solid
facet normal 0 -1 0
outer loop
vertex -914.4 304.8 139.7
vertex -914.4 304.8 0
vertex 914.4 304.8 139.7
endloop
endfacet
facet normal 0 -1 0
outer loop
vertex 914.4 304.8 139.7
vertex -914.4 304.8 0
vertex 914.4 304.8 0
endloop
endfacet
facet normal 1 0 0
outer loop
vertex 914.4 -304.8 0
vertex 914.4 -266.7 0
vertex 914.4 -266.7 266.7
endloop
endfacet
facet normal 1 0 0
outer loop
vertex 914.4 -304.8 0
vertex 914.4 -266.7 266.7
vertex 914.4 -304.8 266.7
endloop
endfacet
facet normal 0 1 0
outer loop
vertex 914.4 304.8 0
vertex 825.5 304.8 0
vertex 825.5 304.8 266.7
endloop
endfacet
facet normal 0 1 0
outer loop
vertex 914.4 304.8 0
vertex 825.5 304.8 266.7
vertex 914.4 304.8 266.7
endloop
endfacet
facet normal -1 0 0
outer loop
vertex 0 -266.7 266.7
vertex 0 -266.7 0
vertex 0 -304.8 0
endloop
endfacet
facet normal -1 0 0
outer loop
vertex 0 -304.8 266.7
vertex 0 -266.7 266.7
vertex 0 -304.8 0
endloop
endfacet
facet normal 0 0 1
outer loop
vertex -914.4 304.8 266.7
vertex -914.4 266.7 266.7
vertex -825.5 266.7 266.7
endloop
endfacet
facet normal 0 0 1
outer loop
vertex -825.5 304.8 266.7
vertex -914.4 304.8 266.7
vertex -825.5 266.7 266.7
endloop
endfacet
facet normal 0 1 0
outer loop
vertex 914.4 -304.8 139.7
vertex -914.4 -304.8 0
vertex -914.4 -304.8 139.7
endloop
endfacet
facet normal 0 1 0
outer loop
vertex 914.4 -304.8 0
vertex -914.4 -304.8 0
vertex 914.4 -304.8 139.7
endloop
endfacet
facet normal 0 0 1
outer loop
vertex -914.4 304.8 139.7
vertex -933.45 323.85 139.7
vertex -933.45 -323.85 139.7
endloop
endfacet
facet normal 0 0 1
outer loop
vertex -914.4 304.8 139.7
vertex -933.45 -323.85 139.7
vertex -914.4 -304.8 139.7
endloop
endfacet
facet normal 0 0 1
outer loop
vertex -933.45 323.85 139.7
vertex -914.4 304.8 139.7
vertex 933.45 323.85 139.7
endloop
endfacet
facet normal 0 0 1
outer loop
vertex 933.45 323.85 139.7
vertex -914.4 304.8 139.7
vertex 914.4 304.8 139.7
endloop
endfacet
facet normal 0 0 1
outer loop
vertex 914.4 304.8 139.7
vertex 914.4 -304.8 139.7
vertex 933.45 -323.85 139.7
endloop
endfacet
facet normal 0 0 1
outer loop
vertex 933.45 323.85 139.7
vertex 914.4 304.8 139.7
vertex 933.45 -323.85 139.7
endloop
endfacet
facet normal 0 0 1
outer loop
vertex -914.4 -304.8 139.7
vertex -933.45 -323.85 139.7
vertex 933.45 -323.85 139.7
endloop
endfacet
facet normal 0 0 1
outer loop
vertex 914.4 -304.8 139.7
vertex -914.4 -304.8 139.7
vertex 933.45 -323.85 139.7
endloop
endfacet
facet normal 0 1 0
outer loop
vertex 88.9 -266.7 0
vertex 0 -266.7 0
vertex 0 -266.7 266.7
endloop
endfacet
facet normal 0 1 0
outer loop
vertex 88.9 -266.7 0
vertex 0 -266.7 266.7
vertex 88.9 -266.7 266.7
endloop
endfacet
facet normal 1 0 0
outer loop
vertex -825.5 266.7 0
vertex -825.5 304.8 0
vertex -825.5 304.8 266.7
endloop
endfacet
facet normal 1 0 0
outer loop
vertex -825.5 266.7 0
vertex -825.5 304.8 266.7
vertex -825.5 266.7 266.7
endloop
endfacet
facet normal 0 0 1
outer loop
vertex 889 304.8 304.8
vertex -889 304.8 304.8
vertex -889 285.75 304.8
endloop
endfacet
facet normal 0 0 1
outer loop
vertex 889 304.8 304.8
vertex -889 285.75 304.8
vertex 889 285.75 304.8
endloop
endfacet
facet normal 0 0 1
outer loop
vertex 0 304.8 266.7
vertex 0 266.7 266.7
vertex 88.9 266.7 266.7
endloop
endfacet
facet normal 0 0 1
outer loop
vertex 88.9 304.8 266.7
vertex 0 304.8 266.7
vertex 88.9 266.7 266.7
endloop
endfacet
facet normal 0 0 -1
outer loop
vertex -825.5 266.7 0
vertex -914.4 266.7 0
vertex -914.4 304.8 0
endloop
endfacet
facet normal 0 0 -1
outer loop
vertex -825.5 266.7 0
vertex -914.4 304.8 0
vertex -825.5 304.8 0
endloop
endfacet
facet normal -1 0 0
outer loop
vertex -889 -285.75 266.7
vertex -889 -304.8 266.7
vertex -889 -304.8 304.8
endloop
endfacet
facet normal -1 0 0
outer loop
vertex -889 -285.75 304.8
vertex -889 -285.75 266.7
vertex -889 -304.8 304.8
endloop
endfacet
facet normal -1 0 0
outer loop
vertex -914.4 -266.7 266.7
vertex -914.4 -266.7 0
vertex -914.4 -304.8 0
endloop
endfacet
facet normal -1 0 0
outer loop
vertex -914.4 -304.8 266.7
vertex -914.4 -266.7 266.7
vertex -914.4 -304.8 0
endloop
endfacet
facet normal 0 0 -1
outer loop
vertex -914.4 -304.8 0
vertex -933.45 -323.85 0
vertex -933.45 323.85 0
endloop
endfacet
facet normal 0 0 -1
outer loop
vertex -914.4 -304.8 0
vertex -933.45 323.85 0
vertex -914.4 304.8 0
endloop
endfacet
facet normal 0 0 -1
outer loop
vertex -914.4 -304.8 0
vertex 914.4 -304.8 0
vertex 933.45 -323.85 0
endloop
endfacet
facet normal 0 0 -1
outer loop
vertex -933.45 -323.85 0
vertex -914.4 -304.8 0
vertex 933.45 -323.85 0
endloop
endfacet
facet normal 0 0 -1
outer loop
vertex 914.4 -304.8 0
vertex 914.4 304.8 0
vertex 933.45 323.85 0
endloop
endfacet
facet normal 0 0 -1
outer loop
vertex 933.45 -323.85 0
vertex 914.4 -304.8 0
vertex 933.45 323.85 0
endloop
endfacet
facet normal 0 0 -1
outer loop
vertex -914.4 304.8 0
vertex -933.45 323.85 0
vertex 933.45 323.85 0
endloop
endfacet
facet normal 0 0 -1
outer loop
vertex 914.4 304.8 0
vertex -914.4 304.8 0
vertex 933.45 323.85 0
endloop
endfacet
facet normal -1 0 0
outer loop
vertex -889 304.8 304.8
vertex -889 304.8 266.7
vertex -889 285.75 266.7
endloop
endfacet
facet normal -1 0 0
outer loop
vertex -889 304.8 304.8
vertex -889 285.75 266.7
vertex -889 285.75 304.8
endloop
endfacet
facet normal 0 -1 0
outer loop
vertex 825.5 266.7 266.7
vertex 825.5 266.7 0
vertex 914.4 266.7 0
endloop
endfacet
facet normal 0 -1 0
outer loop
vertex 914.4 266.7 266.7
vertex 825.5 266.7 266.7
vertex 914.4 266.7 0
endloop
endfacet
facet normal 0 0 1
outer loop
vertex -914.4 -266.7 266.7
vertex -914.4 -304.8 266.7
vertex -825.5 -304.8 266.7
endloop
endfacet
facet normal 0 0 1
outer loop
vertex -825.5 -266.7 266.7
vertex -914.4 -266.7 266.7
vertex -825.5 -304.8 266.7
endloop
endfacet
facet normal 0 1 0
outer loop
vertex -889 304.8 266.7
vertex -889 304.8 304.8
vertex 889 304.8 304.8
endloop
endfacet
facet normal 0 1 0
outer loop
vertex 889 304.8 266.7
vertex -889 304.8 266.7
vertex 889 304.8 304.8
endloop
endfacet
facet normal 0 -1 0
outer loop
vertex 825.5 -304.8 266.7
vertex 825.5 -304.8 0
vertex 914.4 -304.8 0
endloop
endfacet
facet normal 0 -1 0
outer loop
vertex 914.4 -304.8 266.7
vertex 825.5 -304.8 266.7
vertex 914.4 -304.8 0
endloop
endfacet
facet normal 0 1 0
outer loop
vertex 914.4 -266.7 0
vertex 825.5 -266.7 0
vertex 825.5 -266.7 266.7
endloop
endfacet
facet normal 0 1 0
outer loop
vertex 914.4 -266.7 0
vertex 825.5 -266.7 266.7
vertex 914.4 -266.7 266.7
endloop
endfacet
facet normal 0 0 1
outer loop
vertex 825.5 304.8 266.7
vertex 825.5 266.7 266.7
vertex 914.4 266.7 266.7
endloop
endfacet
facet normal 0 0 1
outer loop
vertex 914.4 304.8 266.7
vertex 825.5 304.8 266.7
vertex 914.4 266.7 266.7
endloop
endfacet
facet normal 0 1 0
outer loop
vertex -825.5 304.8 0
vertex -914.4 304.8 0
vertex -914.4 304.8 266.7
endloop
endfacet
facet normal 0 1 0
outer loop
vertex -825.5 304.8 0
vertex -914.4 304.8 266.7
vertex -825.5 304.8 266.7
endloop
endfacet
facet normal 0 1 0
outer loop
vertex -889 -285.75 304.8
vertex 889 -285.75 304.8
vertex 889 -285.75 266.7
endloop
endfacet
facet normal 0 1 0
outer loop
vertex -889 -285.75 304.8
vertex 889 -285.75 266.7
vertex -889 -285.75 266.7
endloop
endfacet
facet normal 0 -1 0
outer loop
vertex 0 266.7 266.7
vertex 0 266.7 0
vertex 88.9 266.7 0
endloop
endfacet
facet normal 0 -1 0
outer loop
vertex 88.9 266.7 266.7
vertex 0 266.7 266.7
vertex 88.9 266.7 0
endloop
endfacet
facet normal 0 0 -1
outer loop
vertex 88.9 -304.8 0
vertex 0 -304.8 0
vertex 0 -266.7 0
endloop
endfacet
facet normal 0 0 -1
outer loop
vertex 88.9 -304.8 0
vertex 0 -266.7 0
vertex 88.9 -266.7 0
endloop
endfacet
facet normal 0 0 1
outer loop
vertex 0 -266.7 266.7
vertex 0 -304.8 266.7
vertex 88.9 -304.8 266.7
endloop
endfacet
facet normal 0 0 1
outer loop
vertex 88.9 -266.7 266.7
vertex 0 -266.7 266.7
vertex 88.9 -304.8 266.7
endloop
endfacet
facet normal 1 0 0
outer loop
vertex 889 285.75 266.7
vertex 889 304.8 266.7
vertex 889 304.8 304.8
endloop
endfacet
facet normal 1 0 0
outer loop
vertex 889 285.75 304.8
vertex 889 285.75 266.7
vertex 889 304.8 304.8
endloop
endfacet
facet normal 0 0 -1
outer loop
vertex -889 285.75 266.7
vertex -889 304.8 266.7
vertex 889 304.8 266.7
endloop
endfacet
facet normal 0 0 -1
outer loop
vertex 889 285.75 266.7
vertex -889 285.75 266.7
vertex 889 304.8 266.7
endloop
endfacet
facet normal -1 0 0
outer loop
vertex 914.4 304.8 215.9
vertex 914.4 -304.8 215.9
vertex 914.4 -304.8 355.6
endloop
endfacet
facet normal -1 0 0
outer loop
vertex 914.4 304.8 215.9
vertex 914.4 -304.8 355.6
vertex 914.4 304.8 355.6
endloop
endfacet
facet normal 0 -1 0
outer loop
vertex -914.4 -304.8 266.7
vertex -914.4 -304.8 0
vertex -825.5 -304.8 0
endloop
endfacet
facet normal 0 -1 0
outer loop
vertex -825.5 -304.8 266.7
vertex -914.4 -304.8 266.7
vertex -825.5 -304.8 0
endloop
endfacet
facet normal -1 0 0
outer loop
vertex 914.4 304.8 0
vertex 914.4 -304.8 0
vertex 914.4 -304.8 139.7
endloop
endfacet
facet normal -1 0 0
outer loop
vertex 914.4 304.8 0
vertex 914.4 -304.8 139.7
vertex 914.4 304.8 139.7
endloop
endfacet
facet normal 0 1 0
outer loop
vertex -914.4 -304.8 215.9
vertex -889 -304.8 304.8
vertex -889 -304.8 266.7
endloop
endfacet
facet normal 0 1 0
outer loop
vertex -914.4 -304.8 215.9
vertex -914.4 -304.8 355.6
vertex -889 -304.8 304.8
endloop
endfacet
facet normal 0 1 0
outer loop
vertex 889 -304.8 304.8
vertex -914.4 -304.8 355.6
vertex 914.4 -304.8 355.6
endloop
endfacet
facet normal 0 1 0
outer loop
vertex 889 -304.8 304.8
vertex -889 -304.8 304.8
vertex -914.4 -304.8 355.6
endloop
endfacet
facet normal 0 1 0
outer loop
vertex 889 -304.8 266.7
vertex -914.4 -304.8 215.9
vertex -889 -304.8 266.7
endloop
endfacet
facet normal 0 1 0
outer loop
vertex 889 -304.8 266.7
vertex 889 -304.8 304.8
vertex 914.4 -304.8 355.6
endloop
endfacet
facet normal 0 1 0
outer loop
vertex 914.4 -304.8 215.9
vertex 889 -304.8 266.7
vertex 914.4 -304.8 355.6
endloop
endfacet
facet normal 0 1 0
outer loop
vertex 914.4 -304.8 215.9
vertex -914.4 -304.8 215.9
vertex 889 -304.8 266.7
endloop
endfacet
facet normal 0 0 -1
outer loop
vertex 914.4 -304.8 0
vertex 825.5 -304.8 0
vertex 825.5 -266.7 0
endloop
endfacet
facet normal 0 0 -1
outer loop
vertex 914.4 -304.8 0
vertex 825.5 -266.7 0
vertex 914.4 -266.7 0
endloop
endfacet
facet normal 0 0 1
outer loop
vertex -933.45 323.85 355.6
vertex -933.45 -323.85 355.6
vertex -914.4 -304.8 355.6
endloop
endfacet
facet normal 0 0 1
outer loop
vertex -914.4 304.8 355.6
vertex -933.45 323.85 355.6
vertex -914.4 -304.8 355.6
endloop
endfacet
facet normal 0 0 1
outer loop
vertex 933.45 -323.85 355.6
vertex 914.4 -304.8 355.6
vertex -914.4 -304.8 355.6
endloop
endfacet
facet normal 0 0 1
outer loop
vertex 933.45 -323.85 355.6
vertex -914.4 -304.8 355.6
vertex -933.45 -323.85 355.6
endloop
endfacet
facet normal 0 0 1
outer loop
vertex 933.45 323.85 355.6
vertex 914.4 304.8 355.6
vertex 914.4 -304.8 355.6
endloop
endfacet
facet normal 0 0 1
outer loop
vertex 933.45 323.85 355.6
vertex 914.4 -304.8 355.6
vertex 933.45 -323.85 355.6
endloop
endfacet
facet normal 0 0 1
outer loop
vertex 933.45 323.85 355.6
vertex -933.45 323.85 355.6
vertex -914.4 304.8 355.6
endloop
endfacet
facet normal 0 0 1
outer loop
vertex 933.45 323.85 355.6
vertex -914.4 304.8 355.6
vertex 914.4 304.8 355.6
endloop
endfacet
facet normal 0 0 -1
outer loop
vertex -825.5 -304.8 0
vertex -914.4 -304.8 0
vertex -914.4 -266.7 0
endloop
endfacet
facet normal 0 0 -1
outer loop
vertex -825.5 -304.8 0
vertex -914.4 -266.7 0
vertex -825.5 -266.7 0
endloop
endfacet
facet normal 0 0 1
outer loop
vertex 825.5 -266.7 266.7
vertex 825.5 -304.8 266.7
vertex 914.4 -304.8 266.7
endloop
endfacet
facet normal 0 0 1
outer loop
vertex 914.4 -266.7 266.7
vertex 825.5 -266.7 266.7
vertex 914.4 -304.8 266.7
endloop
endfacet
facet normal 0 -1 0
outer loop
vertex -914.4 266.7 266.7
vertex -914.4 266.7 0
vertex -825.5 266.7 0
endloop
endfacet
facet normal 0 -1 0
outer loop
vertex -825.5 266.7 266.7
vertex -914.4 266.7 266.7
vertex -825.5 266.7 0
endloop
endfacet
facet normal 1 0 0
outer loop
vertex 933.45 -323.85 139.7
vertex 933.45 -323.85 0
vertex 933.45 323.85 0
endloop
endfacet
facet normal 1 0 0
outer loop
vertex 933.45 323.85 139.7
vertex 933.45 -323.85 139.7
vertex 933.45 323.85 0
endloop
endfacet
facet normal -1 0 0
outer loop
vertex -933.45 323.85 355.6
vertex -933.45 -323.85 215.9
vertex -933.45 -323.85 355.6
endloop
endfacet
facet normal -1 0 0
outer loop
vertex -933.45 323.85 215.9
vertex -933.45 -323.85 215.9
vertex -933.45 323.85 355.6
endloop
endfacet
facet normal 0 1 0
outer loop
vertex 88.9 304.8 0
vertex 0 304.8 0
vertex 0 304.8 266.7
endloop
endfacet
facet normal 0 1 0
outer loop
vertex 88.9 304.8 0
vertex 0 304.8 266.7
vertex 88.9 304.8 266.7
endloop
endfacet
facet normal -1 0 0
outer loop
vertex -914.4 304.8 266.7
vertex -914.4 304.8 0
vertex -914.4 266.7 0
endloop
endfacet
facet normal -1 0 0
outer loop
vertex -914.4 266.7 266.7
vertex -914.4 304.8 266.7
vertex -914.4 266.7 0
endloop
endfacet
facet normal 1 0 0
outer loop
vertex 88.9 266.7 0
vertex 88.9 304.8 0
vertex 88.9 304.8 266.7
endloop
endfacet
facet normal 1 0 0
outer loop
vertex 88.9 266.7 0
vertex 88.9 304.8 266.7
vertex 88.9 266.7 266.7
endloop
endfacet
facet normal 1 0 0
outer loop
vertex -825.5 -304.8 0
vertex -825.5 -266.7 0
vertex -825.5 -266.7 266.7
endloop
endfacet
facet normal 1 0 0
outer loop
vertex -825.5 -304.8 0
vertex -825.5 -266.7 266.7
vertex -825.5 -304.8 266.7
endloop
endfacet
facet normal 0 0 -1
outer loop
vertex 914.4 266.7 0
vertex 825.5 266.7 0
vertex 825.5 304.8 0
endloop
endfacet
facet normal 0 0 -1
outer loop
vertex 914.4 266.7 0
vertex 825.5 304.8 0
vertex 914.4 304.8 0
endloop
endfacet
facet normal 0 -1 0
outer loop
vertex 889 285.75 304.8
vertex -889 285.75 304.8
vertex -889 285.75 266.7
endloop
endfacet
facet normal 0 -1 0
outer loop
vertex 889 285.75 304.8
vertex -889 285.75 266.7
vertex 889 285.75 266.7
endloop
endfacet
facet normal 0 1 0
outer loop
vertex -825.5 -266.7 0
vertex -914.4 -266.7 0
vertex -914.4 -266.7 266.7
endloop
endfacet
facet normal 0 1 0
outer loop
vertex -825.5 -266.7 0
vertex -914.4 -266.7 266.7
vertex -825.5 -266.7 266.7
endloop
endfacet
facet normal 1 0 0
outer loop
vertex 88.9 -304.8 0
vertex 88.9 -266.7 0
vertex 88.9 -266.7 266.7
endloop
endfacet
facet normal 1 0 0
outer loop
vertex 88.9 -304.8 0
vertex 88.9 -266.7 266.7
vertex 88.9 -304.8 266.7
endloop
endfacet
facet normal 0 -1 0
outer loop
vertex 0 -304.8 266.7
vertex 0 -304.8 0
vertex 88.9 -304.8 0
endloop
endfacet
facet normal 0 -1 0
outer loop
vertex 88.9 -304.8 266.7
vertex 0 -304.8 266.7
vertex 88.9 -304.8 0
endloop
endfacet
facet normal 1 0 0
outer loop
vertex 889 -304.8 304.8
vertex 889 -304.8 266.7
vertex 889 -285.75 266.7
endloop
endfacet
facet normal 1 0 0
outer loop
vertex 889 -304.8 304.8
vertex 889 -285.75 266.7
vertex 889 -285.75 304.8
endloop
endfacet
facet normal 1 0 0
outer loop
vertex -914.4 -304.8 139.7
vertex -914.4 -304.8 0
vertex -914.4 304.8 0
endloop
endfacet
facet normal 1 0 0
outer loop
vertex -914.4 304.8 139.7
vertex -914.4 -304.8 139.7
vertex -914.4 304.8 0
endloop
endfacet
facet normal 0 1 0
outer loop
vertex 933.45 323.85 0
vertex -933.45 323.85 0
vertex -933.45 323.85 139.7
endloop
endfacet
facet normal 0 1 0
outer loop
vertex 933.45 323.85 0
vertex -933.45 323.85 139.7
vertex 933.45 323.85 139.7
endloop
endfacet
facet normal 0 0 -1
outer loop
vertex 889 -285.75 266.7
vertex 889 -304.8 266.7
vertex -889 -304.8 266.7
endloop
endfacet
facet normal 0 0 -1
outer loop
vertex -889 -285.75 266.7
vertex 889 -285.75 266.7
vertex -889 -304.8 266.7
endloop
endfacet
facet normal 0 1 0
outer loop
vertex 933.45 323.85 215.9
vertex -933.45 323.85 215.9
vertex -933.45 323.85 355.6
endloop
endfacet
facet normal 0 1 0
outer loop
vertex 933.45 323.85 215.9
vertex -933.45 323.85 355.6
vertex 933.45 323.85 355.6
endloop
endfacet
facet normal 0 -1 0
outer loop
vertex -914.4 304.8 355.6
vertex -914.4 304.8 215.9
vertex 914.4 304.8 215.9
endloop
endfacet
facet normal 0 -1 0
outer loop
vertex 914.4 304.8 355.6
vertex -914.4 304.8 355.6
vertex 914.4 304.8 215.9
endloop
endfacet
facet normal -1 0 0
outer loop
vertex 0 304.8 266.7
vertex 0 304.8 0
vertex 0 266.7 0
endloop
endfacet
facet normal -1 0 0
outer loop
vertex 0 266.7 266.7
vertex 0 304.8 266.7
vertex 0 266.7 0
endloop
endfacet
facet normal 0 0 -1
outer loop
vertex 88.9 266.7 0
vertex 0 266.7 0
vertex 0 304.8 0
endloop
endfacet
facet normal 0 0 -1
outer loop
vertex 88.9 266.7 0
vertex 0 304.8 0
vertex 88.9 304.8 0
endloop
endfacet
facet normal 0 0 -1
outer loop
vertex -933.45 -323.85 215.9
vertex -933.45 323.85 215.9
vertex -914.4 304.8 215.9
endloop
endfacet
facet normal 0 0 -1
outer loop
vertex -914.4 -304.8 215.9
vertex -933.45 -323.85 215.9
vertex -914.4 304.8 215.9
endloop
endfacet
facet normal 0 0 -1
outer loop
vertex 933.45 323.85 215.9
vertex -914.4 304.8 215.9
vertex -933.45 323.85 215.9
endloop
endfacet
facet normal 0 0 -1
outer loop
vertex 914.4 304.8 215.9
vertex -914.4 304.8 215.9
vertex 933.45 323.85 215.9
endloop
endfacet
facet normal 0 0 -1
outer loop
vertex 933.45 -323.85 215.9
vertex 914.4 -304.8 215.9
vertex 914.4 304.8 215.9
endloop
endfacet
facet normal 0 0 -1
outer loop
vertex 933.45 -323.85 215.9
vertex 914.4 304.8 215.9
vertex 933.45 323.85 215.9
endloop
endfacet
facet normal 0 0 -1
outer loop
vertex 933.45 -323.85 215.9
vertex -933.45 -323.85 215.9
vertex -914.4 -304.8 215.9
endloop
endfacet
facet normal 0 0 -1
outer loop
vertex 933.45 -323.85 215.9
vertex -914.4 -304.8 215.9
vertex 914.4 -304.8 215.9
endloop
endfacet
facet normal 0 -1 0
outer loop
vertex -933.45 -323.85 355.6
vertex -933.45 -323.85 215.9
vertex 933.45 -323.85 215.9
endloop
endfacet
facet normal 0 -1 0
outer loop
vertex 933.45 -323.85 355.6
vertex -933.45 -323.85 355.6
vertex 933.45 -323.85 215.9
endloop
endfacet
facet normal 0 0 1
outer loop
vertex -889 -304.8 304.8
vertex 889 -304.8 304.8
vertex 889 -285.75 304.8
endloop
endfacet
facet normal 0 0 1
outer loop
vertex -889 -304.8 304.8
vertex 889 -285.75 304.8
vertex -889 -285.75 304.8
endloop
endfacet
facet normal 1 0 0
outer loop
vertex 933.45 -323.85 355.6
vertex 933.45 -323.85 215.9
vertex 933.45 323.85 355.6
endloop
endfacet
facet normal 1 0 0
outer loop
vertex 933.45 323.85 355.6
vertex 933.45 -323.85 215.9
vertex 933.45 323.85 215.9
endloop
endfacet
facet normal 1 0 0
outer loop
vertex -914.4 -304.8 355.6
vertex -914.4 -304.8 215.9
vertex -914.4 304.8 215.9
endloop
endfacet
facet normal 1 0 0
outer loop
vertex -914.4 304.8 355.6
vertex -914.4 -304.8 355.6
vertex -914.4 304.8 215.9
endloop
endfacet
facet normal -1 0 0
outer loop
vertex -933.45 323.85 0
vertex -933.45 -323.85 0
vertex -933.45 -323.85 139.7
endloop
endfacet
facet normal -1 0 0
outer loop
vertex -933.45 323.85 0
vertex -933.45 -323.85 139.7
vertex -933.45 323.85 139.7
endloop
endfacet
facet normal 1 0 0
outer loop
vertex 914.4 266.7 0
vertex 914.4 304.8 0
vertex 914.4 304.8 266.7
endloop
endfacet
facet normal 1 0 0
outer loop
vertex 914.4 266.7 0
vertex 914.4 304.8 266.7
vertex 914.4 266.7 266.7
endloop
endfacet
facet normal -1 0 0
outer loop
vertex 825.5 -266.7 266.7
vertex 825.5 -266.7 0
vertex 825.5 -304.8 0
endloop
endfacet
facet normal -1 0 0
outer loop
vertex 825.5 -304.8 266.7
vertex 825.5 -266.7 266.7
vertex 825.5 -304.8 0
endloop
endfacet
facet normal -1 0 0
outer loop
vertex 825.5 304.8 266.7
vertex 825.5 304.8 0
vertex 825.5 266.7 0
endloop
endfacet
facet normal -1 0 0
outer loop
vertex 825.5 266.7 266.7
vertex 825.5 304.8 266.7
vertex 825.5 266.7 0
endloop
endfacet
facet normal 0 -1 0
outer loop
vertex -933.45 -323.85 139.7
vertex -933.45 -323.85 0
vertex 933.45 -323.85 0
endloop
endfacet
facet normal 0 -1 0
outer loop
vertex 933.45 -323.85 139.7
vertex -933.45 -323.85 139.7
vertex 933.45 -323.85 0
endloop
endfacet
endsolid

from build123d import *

# Parameters (mm, degrees)
F0_W      = 1866.9
F0_H      = 647.7
F1_DEPTH  = 355.6
F2_T      = -19.05
F3_W      = 1778
F3_H      = 38.1
F4_DEPTH  = 19.05
F5_W      = 1778
F5_H      = 38.1
F6_DEPTH  = 19.05
F7_W      = 1866.9
F7_H      = 76.2
F8_DEPTH  = 647.701
F9_W      = 88.9
F9_H      = 38.1
F10_DEPTH = 266.7


with BuildPart() as f1:
    # F0 (on Top) → F1 (new body)
    with BuildSketch(Plane.XY):
        Rectangle(F0_W, F0_H)
    extrude(amount=F1_DEPTH)

    # F2
    f2_openings = [f1.faces().sort_by_distance(p)[0] for p in [
        (0, 0, 355.6),
        (0, 0, 0),
    ]]
    offset(amount=F2_T, openings=f2_openings)

    # F5 (on face) → F6 (join)
    with BuildSketch(Plane(origin=(0, -304.8, 0), x_dir=(-1, 0, 0), z_dir=(0, 1, 0))):
        with Locations((0, 285.75)):
            Rectangle(F5_W, F5_H)
    extrude(amount=F6_DEPTH)

    # F7 (on face) → F8 (cut, through all)
    with BuildSketch(Plane.XZ.offset(323.85)):
        with Locations((0, 177.8)):
            Rectangle(F7_W, F7_H)
    extrude(amount=-F8_DEPTH, mode=Mode.SUBTRACT)


with BuildPart() as f4:
    # F3 (on face) → F4 (new body)
    with BuildSketch(Plane.XZ.offset(-304.8)):
        with Locations((0, 285.75)):
            Rectangle(F3_W, F3_H)
    extrude(amount=F4_DEPTH)


with BuildPart() as f10:
    # F9 (on face) → F10 (new body, through all)
    with BuildSketch(Plane(origin=(0, 0, 0), x_dir=(1, 0, 0), z_dir=(0, 0, -1))):
        with Locations((-869.95, 285.75)):
            Rectangle(F9_W, F9_H)
        with Locations((-869.95, -285.75)):
            Rectangle(F9_W, F9_H)
        with Locations((44.45, 285.75)):
            Rectangle(F9_W, F9_H)
        with Locations((44.45, -285.75)):
            Rectangle(F9_W, F9_H)
        with Locations((869.95, -285.75)):
            Rectangle(F9_W, F9_H)
        with Locations((869.95, 285.75)):
            Rectangle(F9_W, F9_H)
    extrude(amount=-F10_DEPTH)


solid = Compound([f1.part, f4.part, f10.part])
